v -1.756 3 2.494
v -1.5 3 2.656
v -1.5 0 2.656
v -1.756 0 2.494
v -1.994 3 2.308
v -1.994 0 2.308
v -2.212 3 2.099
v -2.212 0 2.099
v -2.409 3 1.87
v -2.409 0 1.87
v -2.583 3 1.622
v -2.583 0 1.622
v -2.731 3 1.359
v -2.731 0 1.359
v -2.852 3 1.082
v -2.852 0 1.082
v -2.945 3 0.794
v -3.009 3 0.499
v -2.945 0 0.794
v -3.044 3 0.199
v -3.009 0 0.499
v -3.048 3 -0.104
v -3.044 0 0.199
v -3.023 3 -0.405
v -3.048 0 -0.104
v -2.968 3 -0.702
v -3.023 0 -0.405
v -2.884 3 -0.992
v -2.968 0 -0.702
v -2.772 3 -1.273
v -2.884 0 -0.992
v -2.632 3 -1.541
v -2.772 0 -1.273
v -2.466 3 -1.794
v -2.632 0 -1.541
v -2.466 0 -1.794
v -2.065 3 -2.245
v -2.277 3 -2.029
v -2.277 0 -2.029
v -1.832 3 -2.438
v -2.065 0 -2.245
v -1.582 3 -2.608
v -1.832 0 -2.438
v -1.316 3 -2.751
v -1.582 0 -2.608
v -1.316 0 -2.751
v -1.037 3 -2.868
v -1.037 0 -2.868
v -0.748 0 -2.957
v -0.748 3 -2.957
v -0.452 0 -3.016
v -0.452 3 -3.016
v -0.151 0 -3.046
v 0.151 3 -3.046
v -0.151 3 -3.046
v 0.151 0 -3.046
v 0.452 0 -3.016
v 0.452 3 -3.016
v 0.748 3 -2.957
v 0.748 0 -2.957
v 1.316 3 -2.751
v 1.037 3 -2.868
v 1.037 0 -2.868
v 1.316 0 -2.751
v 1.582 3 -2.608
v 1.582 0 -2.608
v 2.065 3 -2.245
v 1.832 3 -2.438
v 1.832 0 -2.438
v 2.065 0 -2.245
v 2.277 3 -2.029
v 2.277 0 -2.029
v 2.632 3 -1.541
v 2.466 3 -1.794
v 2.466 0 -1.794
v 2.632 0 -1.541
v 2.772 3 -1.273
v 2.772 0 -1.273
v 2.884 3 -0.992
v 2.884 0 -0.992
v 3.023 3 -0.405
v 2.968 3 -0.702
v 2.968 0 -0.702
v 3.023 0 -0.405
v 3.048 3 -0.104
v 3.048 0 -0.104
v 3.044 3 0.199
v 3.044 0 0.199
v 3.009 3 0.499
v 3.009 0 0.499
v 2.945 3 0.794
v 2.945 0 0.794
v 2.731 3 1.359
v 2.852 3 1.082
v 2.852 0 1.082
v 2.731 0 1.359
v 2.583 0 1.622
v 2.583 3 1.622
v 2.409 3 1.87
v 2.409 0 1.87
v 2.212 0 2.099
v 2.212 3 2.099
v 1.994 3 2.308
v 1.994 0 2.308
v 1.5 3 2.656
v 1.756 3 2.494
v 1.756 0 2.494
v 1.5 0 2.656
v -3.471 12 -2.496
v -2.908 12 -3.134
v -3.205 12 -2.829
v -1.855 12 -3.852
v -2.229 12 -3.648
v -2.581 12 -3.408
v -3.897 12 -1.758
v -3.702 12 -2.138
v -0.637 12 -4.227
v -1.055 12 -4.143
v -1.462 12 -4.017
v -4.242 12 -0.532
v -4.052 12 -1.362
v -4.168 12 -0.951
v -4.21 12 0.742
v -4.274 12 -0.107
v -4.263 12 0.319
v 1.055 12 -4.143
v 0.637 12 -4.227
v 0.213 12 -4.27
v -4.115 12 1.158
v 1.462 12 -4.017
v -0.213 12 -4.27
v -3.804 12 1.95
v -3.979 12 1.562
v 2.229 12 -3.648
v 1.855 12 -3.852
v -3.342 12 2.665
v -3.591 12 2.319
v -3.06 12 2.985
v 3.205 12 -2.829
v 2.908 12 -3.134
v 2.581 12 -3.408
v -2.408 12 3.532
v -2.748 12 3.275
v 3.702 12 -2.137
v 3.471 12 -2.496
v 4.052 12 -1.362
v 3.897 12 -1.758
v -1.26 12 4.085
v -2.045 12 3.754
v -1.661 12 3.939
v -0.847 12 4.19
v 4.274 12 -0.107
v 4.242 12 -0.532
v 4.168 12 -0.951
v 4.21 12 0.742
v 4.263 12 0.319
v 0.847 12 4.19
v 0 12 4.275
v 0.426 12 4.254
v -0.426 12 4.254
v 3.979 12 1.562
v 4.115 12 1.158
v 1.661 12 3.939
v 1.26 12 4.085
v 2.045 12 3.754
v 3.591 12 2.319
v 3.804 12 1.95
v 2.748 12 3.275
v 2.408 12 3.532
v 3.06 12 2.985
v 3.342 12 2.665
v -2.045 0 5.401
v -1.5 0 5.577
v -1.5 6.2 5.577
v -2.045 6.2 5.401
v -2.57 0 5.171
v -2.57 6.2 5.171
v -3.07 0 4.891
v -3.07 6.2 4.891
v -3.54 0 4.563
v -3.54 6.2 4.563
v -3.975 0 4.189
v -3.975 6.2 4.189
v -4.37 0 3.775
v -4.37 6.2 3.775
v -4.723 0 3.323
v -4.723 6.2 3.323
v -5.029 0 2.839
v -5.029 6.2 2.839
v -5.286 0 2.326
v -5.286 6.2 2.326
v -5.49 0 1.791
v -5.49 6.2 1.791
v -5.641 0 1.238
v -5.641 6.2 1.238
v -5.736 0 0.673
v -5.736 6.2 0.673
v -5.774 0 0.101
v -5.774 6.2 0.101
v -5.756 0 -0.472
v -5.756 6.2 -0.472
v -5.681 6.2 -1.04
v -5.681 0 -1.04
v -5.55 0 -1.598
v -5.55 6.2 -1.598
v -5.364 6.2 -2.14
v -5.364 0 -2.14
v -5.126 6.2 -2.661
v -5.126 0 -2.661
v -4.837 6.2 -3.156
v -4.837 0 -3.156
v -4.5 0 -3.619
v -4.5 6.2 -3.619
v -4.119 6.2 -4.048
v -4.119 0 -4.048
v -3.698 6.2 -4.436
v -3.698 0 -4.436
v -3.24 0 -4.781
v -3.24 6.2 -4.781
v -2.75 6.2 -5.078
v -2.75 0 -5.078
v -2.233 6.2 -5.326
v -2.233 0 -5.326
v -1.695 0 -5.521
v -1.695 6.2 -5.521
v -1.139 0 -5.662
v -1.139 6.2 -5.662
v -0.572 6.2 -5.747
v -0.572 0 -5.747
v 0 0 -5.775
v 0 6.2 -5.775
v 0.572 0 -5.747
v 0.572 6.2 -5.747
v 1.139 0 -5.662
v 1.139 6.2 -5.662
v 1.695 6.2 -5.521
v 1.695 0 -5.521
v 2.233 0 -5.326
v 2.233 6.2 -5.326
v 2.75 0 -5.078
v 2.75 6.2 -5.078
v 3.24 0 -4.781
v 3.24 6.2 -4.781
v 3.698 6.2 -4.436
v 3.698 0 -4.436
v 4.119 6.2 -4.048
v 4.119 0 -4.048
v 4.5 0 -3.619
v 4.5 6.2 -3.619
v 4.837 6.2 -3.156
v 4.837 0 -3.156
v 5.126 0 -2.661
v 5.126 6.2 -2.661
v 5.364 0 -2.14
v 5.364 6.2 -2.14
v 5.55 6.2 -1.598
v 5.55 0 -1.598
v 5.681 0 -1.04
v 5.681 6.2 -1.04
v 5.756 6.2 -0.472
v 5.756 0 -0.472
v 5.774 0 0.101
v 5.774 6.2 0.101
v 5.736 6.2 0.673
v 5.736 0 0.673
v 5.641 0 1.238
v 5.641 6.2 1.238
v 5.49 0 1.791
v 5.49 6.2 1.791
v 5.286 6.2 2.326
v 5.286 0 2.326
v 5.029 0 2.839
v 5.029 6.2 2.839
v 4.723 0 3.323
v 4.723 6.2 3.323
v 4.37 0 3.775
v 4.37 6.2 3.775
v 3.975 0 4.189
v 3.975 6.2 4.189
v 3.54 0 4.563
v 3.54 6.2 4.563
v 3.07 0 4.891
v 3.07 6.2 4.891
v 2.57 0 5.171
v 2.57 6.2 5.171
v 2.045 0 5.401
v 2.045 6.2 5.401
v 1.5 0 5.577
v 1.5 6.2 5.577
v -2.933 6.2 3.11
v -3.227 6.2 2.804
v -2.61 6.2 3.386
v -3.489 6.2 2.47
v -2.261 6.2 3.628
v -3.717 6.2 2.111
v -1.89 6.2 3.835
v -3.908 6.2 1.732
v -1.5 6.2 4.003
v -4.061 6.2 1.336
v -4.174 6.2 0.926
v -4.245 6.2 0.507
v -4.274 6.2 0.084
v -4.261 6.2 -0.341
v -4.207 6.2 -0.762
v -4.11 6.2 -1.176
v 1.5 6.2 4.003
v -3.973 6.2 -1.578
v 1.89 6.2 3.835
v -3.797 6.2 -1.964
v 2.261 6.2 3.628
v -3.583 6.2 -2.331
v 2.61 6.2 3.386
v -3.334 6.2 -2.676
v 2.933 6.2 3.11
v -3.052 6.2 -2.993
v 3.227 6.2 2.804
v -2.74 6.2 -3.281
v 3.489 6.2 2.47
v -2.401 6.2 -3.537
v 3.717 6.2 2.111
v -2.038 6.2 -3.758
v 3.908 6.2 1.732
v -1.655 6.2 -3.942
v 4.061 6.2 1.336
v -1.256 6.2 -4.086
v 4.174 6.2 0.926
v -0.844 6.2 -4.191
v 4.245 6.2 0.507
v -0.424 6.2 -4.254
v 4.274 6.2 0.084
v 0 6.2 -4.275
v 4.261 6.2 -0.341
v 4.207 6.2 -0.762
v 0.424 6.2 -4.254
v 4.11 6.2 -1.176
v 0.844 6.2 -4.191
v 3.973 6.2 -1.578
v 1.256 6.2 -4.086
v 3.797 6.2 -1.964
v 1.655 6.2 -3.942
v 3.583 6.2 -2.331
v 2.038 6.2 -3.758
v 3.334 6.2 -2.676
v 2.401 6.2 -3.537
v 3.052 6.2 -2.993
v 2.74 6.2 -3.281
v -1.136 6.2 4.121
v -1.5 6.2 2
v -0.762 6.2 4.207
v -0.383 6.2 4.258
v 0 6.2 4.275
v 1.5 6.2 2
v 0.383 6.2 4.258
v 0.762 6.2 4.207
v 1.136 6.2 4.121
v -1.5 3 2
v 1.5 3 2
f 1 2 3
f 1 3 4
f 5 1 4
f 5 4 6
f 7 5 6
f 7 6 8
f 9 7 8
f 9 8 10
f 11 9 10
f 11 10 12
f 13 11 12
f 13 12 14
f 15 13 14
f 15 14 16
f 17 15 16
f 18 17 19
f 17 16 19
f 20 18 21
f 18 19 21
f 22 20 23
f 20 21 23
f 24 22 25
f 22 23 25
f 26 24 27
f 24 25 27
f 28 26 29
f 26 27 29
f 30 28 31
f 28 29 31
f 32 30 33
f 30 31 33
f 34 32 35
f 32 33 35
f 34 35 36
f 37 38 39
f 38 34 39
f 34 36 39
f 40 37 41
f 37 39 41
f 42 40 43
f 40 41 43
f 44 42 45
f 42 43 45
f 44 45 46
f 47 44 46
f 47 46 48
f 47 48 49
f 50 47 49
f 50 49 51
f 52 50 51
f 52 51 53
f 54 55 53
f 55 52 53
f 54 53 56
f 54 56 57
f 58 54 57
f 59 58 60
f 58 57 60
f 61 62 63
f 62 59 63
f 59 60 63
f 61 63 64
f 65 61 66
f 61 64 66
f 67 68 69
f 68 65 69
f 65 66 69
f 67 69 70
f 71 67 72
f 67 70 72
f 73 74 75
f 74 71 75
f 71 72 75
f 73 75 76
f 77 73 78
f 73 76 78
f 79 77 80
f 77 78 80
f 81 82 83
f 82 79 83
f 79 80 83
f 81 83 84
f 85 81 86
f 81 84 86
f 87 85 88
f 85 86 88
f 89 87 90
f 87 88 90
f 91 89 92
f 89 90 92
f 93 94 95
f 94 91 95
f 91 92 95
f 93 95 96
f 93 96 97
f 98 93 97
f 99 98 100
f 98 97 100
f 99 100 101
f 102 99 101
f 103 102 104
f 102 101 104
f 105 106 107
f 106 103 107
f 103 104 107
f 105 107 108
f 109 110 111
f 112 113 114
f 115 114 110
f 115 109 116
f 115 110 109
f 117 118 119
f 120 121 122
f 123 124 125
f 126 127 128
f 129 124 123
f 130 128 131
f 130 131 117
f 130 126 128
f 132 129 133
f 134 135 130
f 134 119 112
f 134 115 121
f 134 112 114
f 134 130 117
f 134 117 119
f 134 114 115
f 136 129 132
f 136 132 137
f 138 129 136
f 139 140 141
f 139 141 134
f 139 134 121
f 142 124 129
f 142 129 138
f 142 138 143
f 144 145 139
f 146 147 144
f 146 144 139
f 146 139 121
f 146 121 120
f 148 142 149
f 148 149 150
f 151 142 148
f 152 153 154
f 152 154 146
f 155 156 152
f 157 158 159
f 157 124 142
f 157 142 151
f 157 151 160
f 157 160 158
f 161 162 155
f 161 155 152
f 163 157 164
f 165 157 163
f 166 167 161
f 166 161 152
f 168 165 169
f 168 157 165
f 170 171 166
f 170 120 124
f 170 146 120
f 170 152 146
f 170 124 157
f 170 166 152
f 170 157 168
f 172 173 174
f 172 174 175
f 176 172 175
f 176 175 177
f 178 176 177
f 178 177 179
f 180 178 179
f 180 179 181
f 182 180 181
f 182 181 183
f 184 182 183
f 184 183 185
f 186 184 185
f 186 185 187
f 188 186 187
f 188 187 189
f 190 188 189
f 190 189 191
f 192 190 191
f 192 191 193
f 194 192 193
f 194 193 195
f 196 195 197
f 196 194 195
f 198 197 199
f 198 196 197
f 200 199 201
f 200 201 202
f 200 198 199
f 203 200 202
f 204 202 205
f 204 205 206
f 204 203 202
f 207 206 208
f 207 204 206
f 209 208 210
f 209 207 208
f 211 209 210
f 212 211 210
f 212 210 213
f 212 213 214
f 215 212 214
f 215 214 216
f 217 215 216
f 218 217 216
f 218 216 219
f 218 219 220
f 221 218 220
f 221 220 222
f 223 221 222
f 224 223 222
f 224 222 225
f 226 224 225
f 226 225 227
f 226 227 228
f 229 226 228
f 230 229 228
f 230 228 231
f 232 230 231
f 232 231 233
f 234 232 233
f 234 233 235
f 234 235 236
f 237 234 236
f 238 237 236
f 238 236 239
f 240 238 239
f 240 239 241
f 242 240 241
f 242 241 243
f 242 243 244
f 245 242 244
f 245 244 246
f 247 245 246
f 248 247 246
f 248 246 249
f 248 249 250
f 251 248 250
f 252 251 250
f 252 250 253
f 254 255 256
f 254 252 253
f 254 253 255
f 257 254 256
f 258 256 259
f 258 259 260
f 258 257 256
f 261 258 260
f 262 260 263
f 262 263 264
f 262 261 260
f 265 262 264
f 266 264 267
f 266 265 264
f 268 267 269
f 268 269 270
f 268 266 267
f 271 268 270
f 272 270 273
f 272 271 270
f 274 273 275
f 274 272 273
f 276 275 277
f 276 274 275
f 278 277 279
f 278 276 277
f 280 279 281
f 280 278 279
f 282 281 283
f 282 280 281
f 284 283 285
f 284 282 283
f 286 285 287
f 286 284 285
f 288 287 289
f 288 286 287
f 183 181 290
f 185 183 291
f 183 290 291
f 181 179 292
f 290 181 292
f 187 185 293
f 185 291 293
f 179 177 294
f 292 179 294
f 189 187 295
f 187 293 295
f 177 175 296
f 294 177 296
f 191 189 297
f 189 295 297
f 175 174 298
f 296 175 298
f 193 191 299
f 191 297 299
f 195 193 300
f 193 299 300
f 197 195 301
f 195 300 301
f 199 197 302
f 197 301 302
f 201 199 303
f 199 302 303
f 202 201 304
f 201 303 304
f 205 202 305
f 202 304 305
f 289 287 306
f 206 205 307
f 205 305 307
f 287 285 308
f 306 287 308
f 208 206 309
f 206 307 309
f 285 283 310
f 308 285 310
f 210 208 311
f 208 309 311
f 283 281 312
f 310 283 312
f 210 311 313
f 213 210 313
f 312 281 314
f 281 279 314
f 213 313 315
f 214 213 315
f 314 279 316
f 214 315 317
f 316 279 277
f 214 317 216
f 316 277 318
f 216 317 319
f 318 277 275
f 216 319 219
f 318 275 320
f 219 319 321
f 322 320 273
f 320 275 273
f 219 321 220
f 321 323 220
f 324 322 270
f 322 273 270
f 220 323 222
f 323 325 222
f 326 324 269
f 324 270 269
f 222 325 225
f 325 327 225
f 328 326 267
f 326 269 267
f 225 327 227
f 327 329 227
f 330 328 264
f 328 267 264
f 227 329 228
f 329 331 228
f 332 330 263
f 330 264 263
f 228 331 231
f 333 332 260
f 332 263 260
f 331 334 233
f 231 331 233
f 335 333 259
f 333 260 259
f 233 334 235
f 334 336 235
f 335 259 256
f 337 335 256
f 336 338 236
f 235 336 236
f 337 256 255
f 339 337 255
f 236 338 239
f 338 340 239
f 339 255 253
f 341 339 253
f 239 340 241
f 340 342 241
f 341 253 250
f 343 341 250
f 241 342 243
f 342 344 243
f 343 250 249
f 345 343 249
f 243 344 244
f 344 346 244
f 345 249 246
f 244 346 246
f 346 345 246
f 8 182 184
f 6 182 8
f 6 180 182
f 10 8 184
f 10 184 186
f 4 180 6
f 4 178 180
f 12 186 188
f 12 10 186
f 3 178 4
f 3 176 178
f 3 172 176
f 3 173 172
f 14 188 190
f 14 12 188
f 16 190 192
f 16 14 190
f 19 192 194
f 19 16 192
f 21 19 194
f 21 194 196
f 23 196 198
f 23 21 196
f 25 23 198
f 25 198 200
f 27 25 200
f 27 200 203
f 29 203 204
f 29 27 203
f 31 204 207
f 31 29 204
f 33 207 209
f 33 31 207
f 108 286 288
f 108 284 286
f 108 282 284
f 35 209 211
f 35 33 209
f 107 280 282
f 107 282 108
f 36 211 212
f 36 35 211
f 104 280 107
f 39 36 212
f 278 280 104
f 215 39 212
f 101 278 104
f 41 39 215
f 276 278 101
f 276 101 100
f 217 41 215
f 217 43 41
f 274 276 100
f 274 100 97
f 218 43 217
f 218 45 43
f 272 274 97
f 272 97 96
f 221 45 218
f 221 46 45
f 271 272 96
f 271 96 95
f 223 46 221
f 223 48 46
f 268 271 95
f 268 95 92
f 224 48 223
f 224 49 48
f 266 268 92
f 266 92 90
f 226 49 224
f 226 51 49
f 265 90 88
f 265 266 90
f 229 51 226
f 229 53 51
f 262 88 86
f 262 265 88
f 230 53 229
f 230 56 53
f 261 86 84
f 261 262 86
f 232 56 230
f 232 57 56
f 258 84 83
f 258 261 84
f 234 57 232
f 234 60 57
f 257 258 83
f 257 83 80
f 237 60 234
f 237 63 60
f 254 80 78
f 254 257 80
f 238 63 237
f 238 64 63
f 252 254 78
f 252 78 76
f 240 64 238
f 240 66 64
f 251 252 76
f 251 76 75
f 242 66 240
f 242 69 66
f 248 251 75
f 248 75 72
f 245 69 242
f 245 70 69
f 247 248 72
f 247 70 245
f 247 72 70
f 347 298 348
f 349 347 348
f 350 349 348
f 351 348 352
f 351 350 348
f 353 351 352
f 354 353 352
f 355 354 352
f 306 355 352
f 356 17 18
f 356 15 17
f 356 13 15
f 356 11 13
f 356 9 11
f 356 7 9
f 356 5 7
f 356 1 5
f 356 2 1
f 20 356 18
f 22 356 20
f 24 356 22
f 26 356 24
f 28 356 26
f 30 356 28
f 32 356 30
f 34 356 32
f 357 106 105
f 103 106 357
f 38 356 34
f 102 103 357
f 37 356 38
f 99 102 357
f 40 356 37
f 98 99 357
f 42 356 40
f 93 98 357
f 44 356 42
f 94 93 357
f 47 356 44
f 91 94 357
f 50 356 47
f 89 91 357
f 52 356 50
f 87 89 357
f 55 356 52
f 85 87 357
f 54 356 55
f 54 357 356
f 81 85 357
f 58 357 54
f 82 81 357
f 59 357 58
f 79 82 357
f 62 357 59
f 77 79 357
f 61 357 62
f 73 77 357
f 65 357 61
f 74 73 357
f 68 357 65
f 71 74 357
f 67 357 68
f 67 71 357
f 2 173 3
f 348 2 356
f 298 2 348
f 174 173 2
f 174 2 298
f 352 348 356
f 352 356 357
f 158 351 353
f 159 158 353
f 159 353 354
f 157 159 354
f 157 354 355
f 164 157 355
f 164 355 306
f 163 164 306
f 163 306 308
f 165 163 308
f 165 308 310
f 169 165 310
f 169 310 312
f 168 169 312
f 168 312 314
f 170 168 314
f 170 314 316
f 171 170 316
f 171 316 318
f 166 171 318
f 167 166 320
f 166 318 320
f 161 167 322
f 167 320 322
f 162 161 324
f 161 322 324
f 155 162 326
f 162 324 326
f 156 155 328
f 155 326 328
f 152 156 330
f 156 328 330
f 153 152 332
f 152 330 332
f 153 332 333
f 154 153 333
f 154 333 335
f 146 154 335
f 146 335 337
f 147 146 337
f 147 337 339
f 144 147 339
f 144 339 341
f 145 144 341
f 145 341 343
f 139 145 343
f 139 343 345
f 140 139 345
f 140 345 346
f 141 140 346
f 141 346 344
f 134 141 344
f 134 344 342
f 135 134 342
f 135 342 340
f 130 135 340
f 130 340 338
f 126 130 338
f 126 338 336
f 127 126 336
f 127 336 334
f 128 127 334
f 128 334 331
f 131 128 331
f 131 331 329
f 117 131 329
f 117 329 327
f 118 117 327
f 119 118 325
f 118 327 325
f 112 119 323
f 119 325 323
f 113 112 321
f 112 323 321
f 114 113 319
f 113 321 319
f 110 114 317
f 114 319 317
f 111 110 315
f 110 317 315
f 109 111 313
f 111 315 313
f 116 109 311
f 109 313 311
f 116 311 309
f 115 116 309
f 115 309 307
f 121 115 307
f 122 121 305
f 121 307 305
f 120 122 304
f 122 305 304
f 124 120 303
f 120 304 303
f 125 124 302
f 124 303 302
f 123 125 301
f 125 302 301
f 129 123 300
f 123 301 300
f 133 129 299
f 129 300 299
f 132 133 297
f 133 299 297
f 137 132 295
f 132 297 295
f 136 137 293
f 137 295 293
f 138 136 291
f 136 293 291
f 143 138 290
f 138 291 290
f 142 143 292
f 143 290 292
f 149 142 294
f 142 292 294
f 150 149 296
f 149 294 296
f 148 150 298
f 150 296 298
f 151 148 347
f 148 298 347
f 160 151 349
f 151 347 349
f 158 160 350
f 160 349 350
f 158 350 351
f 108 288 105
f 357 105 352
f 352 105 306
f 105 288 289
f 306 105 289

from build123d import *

# Parameters (mm, degrees)
SKETCH_1_R          = 4.275
EXTRUDE_1_DEPTH     = 12
SKETCH_3_R          = 5.775
EXTRUDE_2_DEPTH     = 6.2
SKETCH_2_R          = 3.05
CUT_EXTRUDE_1_DEPTH = 3
SKETCH_4_W          = 3
SKETCH_4_H          = 6.2
CUT_EXTRUDE_2_DEPTH = 4


with BuildPart() as part:
    # 草图1 → 凸台-拉伸1 (new body)
    with BuildSketch(Plane(origin=(0, 0, 0), x_dir=(1, 0, 0), z_dir=(0, 1, 0))):
        with Locations(Location((0, 0, 0), (0, 0, 270))):
            Circle(SKETCH_1_R)
    extrude(amount=EXTRUDE_1_DEPTH)

    # 草图3 → 凸台-拉伸2 (add)
    with BuildSketch(Plane.XZ):
        with Locations(Location((0, 0, 0), (0, 0, 270))):
            Circle(SKETCH_3_R)
    extrude(amount=-EXTRUDE_2_DEPTH)

    # 草图2 → 切除-拉伸1 (cut)
    with BuildSketch(Plane.XZ):
        with Locations(Location((0, 0, 0), (0, 0, 270))):
            Circle(SKETCH_2_R)
    extrude(amount=-CUT_EXTRUDE_1_DEPTH, mode=Mode.SUBTRACT)

    # 草图4 → 切除-拉伸2 (cut)
    with BuildSketch(Plane.XY.offset(6)):
        with Locations((0, 3.1)):
            Rectangle(SKETCH_4_W, SKETCH_4_H)
    extrude(amount=-CUT_EXTRUDE_2_DEPTH, mode=Mode.SUBTRACT)


solid = part.part
